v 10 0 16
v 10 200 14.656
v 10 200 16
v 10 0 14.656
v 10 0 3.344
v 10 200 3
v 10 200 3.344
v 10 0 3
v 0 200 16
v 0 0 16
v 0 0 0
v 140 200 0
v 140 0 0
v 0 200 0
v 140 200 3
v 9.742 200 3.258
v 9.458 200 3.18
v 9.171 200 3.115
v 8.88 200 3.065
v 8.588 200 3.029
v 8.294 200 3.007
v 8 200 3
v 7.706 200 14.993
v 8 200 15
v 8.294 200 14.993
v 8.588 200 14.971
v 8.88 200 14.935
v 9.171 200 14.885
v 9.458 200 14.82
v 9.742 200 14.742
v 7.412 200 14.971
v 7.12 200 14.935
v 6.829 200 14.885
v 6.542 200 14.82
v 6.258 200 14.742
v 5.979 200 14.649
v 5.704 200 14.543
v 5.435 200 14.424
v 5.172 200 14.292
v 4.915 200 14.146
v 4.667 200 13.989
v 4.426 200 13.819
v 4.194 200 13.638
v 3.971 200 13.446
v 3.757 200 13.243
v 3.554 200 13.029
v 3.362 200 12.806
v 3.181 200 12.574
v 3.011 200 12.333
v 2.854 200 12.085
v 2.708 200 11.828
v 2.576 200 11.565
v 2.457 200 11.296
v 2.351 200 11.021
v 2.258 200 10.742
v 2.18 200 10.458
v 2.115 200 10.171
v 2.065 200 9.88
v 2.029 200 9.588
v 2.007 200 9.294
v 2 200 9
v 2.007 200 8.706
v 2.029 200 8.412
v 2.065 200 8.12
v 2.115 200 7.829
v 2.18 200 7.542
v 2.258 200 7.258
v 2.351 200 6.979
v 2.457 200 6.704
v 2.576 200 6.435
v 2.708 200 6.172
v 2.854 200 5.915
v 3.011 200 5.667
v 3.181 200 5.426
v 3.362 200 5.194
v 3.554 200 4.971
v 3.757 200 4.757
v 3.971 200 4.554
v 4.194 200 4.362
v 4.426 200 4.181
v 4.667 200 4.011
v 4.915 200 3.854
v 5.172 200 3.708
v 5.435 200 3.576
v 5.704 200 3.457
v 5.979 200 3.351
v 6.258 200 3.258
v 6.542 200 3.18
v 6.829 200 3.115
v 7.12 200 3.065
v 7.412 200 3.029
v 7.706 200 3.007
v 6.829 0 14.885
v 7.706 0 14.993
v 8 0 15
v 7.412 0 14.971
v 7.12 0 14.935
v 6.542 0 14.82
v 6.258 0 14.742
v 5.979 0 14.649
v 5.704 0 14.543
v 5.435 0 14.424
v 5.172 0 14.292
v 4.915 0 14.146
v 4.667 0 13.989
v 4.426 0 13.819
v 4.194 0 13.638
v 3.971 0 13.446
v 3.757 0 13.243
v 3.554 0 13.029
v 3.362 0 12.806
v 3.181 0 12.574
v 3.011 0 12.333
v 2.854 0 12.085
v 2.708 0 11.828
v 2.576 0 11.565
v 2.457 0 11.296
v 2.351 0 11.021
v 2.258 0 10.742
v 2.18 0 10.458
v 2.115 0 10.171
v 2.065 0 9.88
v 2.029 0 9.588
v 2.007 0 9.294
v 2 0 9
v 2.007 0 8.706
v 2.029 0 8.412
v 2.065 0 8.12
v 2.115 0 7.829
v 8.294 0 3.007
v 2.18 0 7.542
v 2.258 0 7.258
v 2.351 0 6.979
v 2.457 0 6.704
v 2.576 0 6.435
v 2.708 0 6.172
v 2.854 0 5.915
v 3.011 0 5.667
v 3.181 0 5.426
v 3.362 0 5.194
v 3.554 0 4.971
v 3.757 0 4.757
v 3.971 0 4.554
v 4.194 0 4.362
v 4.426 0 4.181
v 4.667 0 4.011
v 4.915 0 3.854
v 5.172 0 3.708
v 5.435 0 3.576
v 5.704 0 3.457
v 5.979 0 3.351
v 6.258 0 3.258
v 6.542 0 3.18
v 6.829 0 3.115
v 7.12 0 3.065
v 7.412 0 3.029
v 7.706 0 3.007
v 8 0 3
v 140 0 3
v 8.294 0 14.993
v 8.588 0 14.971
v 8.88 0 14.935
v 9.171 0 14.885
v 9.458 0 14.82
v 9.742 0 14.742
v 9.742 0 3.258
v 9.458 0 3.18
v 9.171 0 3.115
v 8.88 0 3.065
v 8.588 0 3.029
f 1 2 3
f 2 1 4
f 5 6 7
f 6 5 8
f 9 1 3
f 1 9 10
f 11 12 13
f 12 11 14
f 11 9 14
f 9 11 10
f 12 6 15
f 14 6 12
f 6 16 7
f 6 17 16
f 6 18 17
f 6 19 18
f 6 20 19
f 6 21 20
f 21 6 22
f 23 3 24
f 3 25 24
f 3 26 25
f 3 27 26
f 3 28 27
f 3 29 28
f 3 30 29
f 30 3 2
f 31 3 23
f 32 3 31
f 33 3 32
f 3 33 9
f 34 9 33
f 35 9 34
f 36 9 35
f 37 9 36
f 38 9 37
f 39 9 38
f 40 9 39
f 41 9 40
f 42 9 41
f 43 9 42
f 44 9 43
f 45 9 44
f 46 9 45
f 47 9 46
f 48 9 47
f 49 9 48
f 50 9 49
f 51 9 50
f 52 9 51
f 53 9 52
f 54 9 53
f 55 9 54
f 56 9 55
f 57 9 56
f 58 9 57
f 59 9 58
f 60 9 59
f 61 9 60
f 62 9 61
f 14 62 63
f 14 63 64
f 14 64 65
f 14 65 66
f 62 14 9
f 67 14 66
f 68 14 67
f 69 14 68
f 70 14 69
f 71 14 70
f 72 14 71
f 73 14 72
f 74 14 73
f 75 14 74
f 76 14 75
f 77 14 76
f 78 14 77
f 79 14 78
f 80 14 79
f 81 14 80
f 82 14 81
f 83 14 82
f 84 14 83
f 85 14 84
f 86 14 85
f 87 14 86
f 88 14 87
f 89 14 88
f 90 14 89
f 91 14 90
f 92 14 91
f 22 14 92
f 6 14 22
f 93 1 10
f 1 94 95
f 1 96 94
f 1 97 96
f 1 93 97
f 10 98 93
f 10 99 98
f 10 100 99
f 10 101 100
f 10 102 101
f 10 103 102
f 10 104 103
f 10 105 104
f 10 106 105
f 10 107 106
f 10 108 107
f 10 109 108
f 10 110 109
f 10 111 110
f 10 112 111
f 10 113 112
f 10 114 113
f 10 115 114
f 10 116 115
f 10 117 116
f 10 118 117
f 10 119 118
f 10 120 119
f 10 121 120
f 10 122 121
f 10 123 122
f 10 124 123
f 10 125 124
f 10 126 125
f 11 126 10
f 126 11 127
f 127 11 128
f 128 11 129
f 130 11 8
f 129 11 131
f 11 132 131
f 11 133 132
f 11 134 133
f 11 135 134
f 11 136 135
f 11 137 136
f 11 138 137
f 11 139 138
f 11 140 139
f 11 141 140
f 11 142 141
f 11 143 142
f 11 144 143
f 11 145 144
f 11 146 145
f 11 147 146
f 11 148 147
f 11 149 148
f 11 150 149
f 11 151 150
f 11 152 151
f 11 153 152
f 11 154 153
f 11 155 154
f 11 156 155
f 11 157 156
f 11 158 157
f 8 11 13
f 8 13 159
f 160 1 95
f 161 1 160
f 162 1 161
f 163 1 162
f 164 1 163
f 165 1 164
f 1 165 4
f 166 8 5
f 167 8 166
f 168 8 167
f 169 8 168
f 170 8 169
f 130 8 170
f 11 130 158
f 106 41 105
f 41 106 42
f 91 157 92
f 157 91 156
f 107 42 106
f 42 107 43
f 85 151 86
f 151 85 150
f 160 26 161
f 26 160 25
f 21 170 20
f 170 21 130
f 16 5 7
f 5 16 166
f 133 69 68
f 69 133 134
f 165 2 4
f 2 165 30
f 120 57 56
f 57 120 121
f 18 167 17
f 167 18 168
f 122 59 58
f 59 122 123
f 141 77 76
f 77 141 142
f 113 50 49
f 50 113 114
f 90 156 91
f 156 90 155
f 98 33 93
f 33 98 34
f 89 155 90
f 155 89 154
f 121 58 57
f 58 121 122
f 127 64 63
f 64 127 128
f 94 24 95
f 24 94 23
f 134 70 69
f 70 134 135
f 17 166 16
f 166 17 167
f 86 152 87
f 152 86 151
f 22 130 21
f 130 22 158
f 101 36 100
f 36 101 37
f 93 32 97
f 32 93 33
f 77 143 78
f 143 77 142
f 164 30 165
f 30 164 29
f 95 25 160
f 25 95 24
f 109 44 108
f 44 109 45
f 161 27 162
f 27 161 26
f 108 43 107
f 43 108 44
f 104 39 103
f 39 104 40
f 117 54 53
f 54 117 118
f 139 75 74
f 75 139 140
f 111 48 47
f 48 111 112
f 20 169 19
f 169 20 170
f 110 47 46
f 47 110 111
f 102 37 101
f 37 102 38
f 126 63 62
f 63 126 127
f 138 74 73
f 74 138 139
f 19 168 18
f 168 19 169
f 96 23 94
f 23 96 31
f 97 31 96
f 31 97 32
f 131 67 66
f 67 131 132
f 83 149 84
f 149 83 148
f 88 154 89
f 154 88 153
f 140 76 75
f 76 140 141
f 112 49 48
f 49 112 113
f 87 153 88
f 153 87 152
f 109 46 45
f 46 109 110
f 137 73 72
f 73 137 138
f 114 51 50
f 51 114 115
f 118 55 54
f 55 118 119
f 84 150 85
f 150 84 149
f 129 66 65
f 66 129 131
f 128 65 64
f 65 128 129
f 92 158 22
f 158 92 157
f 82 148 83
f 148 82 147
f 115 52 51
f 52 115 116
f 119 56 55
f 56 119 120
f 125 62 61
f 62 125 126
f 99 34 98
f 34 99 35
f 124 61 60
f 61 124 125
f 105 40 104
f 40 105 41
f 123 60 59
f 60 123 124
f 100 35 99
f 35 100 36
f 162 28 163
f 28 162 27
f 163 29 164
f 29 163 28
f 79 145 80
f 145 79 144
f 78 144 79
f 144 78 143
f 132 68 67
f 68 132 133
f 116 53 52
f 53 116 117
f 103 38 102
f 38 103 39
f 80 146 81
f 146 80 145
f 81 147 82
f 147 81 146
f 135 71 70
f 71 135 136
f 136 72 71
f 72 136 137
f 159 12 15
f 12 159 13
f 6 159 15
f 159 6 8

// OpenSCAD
$fn=128;
H=140;
W=200;
D=3;
Dia=12;
Buffer=10;
DB=Buffer*2;

cube([H,W,D]);
difference()
{
  cube([10,W,16]);
  translate([8,W+Buffer,9]) rotate([90,0,0]) cylinder(h=W+DB,d=Dia);
}
